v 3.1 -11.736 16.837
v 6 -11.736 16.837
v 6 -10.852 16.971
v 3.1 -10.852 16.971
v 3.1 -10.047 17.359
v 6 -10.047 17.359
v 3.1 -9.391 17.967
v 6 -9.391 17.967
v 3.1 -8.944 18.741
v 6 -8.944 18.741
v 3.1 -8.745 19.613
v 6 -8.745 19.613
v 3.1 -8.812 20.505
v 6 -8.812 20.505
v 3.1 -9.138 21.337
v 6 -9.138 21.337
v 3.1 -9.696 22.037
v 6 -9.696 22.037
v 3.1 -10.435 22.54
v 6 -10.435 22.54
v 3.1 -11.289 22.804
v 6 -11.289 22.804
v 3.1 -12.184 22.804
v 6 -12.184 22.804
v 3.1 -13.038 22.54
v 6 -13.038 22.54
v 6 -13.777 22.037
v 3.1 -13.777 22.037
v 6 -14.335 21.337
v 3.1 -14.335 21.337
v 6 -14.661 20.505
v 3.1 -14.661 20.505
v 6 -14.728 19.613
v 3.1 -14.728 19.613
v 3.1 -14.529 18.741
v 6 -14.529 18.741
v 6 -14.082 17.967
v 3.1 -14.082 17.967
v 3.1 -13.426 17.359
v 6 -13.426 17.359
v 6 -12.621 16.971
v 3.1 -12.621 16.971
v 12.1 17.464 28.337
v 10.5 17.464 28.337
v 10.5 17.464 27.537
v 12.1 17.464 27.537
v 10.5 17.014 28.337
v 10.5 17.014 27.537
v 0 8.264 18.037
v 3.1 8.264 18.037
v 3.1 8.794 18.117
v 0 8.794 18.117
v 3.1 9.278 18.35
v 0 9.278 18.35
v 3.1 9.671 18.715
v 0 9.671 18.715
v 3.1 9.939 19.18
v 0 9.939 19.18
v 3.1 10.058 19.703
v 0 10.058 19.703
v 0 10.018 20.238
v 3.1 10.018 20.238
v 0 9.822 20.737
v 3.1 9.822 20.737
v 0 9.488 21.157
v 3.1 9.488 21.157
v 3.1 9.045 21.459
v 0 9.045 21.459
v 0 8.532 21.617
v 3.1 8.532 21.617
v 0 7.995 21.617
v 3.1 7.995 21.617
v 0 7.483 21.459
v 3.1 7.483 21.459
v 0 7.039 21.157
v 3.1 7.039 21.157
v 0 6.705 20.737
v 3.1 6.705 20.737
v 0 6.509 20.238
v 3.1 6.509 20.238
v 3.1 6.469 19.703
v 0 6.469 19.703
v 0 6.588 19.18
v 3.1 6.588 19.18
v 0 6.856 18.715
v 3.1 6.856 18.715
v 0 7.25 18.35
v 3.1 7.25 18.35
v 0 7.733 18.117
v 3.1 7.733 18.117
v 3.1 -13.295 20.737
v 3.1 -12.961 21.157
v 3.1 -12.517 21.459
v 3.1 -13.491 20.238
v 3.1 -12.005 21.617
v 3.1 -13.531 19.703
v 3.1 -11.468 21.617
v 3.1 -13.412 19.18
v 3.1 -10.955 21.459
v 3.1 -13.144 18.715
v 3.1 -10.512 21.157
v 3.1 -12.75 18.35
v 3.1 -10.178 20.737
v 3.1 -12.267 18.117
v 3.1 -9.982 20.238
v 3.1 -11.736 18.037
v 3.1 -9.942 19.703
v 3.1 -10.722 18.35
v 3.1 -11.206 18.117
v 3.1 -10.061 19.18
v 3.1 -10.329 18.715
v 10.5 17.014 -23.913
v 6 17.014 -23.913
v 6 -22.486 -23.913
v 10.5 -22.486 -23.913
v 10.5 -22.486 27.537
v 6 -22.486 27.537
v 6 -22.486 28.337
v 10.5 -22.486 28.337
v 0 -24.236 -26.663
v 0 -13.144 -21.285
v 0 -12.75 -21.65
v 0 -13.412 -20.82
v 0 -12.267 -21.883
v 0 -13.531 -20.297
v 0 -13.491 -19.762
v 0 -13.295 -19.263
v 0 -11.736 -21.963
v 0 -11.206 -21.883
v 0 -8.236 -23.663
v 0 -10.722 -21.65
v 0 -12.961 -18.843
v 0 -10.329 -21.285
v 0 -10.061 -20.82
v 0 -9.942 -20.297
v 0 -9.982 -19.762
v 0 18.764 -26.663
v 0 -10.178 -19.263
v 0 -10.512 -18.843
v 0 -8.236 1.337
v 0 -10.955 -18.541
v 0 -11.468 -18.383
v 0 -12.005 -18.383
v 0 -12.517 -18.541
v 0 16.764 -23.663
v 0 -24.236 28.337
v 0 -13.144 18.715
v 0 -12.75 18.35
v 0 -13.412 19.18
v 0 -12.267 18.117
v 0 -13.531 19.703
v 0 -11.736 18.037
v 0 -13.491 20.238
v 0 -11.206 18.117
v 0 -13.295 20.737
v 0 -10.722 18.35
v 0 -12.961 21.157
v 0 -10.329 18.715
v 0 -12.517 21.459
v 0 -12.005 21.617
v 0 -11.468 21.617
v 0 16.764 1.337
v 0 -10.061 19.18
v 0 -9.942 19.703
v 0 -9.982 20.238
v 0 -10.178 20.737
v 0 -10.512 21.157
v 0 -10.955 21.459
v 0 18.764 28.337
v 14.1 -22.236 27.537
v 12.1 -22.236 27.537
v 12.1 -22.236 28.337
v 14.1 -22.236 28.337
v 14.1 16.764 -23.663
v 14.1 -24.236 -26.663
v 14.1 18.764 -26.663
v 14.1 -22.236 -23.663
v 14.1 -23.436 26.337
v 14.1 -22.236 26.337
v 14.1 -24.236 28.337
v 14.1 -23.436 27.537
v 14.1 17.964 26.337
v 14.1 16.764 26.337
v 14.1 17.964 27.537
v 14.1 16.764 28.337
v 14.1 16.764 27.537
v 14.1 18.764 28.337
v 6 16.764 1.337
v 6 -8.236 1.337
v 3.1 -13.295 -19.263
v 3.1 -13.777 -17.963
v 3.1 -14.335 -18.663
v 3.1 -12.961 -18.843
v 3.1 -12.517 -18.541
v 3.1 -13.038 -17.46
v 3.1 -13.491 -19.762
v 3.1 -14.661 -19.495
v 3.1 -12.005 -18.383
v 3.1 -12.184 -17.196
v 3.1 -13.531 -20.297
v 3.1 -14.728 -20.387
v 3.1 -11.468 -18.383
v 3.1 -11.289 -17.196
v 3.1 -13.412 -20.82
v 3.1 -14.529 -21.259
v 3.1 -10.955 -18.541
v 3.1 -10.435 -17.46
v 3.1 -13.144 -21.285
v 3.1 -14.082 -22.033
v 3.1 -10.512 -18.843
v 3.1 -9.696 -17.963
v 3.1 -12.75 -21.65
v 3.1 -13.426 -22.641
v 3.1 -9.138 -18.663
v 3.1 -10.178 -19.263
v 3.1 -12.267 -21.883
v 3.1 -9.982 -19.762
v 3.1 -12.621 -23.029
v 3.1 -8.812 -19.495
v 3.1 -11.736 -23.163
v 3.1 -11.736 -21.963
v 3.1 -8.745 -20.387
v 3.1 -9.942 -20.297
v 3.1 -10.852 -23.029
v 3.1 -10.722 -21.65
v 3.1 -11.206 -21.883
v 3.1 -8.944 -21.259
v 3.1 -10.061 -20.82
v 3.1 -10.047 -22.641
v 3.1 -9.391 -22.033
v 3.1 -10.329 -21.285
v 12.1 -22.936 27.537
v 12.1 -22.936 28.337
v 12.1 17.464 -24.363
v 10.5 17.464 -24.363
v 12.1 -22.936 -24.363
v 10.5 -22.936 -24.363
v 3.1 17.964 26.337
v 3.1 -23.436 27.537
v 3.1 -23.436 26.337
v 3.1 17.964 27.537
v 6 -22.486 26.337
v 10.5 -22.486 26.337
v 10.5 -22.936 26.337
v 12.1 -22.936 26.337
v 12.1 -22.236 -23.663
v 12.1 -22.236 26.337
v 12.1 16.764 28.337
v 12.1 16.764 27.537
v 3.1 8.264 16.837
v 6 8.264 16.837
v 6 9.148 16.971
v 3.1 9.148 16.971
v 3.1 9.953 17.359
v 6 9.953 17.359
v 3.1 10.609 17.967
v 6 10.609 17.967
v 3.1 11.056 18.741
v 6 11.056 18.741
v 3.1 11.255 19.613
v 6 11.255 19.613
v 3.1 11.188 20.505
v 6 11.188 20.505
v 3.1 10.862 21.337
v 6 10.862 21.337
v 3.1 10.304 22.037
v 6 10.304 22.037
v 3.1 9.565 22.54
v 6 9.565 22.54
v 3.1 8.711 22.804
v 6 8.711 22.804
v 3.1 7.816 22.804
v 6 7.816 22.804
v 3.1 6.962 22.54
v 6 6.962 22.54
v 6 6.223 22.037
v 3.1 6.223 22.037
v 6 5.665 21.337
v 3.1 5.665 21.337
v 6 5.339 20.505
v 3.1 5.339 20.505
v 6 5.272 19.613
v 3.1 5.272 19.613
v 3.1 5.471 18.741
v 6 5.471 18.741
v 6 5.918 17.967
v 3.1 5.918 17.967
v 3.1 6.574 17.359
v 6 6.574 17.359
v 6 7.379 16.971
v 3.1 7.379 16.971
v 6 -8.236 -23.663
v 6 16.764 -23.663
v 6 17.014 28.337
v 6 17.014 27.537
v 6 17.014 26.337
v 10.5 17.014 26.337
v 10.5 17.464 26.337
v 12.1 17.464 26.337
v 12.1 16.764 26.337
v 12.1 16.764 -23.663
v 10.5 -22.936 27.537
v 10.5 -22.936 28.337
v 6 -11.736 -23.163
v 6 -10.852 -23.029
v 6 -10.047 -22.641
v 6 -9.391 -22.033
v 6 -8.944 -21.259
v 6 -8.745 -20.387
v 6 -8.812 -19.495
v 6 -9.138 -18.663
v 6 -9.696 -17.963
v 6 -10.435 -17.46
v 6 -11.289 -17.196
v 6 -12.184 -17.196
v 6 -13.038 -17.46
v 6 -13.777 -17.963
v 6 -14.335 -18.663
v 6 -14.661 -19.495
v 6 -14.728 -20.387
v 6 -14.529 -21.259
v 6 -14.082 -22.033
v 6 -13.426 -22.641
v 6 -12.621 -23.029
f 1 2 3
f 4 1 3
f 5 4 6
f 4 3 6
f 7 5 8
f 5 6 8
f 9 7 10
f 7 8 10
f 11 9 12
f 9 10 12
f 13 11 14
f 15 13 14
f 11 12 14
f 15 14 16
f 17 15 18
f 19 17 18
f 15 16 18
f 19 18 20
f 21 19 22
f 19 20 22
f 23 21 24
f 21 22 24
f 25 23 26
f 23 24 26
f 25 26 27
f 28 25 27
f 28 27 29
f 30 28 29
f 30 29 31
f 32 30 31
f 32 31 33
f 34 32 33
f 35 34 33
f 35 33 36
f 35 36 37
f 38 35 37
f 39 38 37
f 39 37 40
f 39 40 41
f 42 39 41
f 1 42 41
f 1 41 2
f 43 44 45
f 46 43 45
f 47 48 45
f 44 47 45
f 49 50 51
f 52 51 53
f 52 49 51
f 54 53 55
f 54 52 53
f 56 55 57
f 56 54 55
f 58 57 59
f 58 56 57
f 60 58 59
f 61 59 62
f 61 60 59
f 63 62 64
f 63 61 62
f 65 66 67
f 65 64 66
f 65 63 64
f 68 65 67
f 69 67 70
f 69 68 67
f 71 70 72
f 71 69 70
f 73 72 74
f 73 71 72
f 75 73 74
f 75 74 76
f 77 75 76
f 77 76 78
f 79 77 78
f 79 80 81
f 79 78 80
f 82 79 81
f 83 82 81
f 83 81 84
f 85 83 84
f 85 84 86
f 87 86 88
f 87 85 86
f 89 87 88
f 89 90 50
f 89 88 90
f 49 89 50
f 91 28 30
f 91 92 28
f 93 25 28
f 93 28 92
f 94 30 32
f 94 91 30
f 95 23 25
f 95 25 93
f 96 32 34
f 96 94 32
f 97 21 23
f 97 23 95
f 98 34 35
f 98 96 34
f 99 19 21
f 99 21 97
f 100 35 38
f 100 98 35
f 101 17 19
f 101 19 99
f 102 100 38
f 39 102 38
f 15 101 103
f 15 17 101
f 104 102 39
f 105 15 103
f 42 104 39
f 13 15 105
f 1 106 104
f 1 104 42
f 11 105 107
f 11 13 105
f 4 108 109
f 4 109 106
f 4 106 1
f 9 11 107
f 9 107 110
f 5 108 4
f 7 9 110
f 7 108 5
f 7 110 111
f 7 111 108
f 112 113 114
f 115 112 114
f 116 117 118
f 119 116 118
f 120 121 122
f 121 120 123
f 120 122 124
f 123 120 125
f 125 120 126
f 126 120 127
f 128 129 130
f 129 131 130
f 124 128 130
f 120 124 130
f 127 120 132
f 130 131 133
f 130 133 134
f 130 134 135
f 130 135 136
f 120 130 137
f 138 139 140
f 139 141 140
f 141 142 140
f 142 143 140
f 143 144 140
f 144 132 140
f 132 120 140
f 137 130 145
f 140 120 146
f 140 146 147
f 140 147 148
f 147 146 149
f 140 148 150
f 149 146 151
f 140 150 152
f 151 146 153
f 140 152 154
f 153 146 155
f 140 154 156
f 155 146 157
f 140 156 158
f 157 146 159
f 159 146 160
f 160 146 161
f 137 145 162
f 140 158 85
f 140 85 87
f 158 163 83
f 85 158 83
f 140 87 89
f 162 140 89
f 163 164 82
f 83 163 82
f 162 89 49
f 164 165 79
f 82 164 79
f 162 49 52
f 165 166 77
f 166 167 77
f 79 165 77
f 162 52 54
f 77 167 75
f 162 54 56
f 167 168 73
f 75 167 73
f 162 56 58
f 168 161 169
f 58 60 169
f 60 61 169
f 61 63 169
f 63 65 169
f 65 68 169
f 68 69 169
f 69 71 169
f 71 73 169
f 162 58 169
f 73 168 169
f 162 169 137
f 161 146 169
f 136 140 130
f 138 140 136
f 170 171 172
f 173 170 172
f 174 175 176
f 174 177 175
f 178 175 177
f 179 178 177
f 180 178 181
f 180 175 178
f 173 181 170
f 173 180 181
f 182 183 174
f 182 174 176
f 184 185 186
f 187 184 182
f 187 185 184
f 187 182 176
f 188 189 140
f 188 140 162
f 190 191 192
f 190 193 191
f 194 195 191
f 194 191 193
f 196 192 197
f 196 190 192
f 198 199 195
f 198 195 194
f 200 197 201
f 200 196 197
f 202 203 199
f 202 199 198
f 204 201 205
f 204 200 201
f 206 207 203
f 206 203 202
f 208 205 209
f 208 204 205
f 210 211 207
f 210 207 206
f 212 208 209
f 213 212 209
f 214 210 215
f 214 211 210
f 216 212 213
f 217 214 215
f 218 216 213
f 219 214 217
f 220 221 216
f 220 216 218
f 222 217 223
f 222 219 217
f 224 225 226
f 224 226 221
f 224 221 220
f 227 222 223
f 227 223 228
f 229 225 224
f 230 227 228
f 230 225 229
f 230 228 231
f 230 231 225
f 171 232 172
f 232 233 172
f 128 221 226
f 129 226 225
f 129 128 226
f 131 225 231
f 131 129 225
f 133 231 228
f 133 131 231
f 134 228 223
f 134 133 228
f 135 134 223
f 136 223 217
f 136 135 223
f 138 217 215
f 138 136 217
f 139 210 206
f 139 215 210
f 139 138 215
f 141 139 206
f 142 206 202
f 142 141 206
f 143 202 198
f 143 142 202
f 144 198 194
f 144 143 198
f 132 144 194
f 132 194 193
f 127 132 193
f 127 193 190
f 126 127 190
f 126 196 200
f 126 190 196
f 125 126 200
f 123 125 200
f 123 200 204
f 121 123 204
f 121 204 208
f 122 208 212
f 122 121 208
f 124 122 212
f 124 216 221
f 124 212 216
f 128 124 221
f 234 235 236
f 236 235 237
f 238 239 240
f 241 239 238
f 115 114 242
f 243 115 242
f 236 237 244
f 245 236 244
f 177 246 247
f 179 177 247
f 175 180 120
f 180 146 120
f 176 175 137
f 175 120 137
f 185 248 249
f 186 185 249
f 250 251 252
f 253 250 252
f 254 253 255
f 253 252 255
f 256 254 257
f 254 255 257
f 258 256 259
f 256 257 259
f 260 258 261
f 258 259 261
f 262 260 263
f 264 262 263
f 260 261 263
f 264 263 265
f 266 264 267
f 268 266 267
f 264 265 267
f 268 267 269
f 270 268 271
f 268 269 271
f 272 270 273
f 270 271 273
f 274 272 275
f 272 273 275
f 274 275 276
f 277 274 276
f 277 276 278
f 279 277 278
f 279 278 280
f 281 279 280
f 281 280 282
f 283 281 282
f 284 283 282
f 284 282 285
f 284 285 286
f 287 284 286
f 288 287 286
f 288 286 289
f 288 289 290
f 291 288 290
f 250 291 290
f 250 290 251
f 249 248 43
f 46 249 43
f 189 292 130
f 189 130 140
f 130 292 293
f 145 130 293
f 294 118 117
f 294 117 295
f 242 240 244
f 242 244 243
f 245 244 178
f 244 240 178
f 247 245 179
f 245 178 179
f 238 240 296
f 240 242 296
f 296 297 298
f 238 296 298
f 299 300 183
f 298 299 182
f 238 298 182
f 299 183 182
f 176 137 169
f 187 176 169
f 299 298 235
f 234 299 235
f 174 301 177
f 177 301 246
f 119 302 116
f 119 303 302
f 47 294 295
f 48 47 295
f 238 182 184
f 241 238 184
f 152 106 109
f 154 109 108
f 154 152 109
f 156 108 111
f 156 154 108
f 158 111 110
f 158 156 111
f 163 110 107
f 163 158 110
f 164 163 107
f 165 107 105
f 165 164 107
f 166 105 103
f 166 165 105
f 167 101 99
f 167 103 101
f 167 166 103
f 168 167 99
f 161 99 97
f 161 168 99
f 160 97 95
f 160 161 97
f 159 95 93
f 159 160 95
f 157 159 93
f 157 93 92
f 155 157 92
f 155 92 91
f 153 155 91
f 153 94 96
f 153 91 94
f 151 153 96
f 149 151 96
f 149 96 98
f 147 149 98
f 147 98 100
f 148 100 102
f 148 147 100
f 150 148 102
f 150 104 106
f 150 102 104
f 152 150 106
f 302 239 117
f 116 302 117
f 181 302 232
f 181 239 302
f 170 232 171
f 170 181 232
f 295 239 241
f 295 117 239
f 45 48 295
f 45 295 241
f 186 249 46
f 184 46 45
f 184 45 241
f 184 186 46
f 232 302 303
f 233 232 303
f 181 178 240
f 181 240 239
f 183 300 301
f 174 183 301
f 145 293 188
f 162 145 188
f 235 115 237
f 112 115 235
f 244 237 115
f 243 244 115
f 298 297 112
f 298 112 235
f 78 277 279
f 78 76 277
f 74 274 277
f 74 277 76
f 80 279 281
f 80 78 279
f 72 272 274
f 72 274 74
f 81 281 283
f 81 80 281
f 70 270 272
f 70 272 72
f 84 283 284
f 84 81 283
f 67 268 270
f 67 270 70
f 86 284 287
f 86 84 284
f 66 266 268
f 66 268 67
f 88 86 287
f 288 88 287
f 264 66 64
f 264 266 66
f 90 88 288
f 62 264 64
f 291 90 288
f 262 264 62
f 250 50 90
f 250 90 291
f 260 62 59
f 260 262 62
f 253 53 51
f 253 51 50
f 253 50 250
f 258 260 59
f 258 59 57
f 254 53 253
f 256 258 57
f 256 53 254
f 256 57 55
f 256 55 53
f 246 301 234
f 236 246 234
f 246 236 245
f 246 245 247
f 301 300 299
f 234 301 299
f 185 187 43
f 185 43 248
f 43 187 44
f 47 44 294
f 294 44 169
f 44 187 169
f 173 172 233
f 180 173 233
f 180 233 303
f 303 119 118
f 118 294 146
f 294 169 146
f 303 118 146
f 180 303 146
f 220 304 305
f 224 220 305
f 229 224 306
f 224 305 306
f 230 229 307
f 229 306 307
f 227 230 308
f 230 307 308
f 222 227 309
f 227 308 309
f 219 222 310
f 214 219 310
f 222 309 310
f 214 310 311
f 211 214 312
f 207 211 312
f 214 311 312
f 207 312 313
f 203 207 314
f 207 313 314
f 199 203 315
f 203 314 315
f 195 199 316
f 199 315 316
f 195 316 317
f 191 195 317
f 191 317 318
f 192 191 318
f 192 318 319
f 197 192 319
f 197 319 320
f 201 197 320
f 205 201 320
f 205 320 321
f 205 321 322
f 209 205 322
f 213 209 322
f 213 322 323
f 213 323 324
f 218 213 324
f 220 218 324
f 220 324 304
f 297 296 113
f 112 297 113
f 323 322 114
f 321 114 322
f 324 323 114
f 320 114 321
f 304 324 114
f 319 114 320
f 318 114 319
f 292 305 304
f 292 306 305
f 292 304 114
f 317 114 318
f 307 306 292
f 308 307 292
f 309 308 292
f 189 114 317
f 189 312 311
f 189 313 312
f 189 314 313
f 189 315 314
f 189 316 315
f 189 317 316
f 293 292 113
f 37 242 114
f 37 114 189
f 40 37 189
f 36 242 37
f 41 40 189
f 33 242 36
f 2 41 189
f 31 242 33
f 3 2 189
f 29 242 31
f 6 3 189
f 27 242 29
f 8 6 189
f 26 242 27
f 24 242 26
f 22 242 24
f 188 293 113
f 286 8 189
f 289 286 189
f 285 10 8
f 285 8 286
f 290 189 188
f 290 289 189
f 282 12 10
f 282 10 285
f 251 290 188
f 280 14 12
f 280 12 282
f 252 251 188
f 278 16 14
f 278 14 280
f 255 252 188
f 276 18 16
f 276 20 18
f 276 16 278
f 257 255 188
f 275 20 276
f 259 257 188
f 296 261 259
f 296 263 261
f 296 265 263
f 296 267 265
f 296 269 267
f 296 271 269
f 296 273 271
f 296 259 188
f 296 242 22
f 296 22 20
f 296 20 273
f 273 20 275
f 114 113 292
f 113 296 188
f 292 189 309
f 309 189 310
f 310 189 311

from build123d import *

# Parameters (mm, degrees)
SKETCH1_W           = 43
SKETCH1_H           = 55
SKETCH1_R           = 1.8
BOSS_EXTRUDE1_DEPTH = 6
BOSS_EXTRUDE2_DEPTH = 4.5
BOSS_EXTRUDE3_DEPTH = 1.6
BOSS_EXTRUDE4_DEPTH = 2
SKETCH7_R           = 3
CUT_EXTRUDE2_DEPTH  = 11
SKETCH11_W          = 25
SKETCH11_H          = 25
CUT_EXTRUDE5_DEPTH  = 11.5
SKETCH17_W          = 41.4
SKETCH17_H          = 1.2
CUT_EXTRUDE7_DEPTH  = 11


with BuildPart() as part:
    # Sketch1 → Boss-Extrude1 (new body)
    with BuildSketch(Plane.YZ):
        with Locations((-2.736471392, 0.837454611)):
            Rectangle(SKETCH1_W, SKETCH1_H)
        with Locations(Location((-11.736471392, -20.162545389, 0), (0, 0, 270))):
            Circle(SKETCH1_R, mode=Mode.SUBTRACT)
        with Locations(Location((-11.736471392, 19.837454611, 0), (0, 0, 270))):
            Circle(SKETCH1_R, mode=Mode.SUBTRACT)
        with Locations(Location((8.263528608, 19.837454611, 0), (0, 0, 270))):
            Circle(SKETCH1_R, mode=Mode.SUBTRACT)
    extrude(amount=BOSS_EXTRUDE1_DEPTH)

    # Sketch3 → Boss-Extrude2 (add)
    with BuildSketch(Plane.YZ.offset(6)):
        Polygon((-22.486471392, 25.587454611), (-22.486471392, 28.337454611), (-24.236471392, 28.337454611), (-24.236471392, -26.662545389), (18.763528608, -26.662545389), (18.763528608, 28.337454611), (17.013528608, 28.337454611), (17.013528608, 25.587454611), (17.013528608, -23.912545389), (-22.486471392, -23.912545389), align=None)
    extrude(amount=BOSS_EXTRUDE2_DEPTH)

    # Sketch5 → Boss-Extrude3 (add)
    with BuildSketch(Plane.YZ.offset(10.5)):
        Polygon((-22.936471392, 26.037454611), (-22.936471392, 28.337454611), (-24.236471392, 28.337454611), (-24.236471392, -26.662545389), (18.763528608, -26.662545389), (18.763528608, 28.337454611), (17.463528608, 28.337454611), (17.463528608, 26.037454611), (17.463528608, -24.362545389), (-22.936471392, -24.362545389), align=None)
    extrude(amount=BOSS_EXTRUDE3_DEPTH)

    # Sketch6 → Boss-Extrude4 (add)
    with BuildSketch(Plane.YZ.offset(12.1)):
        Polygon((-22.236471392, 25.337454611), (-22.236471392, 28.337454611), (-24.236471392, 28.337454611), (-24.236471392, -26.662545389), (18.763528608, -26.662545389), (18.763528608, 28.337454611), (16.763528608, 28.337454611), (16.763528608, 25.337454611), (16.763528608, -23.662545389), (-22.236471392, -23.662545389), align=None)
    extrude(amount=BOSS_EXTRUDE4_DEPTH)

    # Sketch7 → Cut-Extrude2 (cut)
    with BuildSketch(Plane.YZ.offset(14.1)):
        with Locations(Location((-11.736471392, -20.162545389, 0), (0, 0, 270))):
            Circle(SKETCH7_R)
        with Locations(Location((-11.736471392, 19.837454611, 0), (0, 0, 270))):
            Circle(SKETCH7_R)
        with Locations(Location((8.263528608, 19.837454611, 0), (0, 0, 270))):
            Circle(SKETCH7_R)
    extrude(amount=-CUT_EXTRUDE2_DEPTH, mode=Mode.SUBTRACT)

    # Sketch11 → Cut-Extrude5 (cut)
    with BuildSketch(Plane.YZ.offset(6)):
        with Locations((4.263528608, -11.162545389)):
            Rectangle(SKETCH11_W, SKETCH11_H)
    extrude(amount=-CUT_EXTRUDE5_DEPTH, mode=Mode.SUBTRACT)

    # Sketch17 → Cut-Extrude7 (cut)
    with BuildSketch(Plane.YZ.offset(14.1)):
        with Locations((-2.736471392, 26.937454611)):
            Rectangle(SKETCH17_W, SKETCH17_H)
    extrude(amount=-CUT_EXTRUDE7_DEPTH, mode=Mode.SUBTRACT)


solid = part.part
